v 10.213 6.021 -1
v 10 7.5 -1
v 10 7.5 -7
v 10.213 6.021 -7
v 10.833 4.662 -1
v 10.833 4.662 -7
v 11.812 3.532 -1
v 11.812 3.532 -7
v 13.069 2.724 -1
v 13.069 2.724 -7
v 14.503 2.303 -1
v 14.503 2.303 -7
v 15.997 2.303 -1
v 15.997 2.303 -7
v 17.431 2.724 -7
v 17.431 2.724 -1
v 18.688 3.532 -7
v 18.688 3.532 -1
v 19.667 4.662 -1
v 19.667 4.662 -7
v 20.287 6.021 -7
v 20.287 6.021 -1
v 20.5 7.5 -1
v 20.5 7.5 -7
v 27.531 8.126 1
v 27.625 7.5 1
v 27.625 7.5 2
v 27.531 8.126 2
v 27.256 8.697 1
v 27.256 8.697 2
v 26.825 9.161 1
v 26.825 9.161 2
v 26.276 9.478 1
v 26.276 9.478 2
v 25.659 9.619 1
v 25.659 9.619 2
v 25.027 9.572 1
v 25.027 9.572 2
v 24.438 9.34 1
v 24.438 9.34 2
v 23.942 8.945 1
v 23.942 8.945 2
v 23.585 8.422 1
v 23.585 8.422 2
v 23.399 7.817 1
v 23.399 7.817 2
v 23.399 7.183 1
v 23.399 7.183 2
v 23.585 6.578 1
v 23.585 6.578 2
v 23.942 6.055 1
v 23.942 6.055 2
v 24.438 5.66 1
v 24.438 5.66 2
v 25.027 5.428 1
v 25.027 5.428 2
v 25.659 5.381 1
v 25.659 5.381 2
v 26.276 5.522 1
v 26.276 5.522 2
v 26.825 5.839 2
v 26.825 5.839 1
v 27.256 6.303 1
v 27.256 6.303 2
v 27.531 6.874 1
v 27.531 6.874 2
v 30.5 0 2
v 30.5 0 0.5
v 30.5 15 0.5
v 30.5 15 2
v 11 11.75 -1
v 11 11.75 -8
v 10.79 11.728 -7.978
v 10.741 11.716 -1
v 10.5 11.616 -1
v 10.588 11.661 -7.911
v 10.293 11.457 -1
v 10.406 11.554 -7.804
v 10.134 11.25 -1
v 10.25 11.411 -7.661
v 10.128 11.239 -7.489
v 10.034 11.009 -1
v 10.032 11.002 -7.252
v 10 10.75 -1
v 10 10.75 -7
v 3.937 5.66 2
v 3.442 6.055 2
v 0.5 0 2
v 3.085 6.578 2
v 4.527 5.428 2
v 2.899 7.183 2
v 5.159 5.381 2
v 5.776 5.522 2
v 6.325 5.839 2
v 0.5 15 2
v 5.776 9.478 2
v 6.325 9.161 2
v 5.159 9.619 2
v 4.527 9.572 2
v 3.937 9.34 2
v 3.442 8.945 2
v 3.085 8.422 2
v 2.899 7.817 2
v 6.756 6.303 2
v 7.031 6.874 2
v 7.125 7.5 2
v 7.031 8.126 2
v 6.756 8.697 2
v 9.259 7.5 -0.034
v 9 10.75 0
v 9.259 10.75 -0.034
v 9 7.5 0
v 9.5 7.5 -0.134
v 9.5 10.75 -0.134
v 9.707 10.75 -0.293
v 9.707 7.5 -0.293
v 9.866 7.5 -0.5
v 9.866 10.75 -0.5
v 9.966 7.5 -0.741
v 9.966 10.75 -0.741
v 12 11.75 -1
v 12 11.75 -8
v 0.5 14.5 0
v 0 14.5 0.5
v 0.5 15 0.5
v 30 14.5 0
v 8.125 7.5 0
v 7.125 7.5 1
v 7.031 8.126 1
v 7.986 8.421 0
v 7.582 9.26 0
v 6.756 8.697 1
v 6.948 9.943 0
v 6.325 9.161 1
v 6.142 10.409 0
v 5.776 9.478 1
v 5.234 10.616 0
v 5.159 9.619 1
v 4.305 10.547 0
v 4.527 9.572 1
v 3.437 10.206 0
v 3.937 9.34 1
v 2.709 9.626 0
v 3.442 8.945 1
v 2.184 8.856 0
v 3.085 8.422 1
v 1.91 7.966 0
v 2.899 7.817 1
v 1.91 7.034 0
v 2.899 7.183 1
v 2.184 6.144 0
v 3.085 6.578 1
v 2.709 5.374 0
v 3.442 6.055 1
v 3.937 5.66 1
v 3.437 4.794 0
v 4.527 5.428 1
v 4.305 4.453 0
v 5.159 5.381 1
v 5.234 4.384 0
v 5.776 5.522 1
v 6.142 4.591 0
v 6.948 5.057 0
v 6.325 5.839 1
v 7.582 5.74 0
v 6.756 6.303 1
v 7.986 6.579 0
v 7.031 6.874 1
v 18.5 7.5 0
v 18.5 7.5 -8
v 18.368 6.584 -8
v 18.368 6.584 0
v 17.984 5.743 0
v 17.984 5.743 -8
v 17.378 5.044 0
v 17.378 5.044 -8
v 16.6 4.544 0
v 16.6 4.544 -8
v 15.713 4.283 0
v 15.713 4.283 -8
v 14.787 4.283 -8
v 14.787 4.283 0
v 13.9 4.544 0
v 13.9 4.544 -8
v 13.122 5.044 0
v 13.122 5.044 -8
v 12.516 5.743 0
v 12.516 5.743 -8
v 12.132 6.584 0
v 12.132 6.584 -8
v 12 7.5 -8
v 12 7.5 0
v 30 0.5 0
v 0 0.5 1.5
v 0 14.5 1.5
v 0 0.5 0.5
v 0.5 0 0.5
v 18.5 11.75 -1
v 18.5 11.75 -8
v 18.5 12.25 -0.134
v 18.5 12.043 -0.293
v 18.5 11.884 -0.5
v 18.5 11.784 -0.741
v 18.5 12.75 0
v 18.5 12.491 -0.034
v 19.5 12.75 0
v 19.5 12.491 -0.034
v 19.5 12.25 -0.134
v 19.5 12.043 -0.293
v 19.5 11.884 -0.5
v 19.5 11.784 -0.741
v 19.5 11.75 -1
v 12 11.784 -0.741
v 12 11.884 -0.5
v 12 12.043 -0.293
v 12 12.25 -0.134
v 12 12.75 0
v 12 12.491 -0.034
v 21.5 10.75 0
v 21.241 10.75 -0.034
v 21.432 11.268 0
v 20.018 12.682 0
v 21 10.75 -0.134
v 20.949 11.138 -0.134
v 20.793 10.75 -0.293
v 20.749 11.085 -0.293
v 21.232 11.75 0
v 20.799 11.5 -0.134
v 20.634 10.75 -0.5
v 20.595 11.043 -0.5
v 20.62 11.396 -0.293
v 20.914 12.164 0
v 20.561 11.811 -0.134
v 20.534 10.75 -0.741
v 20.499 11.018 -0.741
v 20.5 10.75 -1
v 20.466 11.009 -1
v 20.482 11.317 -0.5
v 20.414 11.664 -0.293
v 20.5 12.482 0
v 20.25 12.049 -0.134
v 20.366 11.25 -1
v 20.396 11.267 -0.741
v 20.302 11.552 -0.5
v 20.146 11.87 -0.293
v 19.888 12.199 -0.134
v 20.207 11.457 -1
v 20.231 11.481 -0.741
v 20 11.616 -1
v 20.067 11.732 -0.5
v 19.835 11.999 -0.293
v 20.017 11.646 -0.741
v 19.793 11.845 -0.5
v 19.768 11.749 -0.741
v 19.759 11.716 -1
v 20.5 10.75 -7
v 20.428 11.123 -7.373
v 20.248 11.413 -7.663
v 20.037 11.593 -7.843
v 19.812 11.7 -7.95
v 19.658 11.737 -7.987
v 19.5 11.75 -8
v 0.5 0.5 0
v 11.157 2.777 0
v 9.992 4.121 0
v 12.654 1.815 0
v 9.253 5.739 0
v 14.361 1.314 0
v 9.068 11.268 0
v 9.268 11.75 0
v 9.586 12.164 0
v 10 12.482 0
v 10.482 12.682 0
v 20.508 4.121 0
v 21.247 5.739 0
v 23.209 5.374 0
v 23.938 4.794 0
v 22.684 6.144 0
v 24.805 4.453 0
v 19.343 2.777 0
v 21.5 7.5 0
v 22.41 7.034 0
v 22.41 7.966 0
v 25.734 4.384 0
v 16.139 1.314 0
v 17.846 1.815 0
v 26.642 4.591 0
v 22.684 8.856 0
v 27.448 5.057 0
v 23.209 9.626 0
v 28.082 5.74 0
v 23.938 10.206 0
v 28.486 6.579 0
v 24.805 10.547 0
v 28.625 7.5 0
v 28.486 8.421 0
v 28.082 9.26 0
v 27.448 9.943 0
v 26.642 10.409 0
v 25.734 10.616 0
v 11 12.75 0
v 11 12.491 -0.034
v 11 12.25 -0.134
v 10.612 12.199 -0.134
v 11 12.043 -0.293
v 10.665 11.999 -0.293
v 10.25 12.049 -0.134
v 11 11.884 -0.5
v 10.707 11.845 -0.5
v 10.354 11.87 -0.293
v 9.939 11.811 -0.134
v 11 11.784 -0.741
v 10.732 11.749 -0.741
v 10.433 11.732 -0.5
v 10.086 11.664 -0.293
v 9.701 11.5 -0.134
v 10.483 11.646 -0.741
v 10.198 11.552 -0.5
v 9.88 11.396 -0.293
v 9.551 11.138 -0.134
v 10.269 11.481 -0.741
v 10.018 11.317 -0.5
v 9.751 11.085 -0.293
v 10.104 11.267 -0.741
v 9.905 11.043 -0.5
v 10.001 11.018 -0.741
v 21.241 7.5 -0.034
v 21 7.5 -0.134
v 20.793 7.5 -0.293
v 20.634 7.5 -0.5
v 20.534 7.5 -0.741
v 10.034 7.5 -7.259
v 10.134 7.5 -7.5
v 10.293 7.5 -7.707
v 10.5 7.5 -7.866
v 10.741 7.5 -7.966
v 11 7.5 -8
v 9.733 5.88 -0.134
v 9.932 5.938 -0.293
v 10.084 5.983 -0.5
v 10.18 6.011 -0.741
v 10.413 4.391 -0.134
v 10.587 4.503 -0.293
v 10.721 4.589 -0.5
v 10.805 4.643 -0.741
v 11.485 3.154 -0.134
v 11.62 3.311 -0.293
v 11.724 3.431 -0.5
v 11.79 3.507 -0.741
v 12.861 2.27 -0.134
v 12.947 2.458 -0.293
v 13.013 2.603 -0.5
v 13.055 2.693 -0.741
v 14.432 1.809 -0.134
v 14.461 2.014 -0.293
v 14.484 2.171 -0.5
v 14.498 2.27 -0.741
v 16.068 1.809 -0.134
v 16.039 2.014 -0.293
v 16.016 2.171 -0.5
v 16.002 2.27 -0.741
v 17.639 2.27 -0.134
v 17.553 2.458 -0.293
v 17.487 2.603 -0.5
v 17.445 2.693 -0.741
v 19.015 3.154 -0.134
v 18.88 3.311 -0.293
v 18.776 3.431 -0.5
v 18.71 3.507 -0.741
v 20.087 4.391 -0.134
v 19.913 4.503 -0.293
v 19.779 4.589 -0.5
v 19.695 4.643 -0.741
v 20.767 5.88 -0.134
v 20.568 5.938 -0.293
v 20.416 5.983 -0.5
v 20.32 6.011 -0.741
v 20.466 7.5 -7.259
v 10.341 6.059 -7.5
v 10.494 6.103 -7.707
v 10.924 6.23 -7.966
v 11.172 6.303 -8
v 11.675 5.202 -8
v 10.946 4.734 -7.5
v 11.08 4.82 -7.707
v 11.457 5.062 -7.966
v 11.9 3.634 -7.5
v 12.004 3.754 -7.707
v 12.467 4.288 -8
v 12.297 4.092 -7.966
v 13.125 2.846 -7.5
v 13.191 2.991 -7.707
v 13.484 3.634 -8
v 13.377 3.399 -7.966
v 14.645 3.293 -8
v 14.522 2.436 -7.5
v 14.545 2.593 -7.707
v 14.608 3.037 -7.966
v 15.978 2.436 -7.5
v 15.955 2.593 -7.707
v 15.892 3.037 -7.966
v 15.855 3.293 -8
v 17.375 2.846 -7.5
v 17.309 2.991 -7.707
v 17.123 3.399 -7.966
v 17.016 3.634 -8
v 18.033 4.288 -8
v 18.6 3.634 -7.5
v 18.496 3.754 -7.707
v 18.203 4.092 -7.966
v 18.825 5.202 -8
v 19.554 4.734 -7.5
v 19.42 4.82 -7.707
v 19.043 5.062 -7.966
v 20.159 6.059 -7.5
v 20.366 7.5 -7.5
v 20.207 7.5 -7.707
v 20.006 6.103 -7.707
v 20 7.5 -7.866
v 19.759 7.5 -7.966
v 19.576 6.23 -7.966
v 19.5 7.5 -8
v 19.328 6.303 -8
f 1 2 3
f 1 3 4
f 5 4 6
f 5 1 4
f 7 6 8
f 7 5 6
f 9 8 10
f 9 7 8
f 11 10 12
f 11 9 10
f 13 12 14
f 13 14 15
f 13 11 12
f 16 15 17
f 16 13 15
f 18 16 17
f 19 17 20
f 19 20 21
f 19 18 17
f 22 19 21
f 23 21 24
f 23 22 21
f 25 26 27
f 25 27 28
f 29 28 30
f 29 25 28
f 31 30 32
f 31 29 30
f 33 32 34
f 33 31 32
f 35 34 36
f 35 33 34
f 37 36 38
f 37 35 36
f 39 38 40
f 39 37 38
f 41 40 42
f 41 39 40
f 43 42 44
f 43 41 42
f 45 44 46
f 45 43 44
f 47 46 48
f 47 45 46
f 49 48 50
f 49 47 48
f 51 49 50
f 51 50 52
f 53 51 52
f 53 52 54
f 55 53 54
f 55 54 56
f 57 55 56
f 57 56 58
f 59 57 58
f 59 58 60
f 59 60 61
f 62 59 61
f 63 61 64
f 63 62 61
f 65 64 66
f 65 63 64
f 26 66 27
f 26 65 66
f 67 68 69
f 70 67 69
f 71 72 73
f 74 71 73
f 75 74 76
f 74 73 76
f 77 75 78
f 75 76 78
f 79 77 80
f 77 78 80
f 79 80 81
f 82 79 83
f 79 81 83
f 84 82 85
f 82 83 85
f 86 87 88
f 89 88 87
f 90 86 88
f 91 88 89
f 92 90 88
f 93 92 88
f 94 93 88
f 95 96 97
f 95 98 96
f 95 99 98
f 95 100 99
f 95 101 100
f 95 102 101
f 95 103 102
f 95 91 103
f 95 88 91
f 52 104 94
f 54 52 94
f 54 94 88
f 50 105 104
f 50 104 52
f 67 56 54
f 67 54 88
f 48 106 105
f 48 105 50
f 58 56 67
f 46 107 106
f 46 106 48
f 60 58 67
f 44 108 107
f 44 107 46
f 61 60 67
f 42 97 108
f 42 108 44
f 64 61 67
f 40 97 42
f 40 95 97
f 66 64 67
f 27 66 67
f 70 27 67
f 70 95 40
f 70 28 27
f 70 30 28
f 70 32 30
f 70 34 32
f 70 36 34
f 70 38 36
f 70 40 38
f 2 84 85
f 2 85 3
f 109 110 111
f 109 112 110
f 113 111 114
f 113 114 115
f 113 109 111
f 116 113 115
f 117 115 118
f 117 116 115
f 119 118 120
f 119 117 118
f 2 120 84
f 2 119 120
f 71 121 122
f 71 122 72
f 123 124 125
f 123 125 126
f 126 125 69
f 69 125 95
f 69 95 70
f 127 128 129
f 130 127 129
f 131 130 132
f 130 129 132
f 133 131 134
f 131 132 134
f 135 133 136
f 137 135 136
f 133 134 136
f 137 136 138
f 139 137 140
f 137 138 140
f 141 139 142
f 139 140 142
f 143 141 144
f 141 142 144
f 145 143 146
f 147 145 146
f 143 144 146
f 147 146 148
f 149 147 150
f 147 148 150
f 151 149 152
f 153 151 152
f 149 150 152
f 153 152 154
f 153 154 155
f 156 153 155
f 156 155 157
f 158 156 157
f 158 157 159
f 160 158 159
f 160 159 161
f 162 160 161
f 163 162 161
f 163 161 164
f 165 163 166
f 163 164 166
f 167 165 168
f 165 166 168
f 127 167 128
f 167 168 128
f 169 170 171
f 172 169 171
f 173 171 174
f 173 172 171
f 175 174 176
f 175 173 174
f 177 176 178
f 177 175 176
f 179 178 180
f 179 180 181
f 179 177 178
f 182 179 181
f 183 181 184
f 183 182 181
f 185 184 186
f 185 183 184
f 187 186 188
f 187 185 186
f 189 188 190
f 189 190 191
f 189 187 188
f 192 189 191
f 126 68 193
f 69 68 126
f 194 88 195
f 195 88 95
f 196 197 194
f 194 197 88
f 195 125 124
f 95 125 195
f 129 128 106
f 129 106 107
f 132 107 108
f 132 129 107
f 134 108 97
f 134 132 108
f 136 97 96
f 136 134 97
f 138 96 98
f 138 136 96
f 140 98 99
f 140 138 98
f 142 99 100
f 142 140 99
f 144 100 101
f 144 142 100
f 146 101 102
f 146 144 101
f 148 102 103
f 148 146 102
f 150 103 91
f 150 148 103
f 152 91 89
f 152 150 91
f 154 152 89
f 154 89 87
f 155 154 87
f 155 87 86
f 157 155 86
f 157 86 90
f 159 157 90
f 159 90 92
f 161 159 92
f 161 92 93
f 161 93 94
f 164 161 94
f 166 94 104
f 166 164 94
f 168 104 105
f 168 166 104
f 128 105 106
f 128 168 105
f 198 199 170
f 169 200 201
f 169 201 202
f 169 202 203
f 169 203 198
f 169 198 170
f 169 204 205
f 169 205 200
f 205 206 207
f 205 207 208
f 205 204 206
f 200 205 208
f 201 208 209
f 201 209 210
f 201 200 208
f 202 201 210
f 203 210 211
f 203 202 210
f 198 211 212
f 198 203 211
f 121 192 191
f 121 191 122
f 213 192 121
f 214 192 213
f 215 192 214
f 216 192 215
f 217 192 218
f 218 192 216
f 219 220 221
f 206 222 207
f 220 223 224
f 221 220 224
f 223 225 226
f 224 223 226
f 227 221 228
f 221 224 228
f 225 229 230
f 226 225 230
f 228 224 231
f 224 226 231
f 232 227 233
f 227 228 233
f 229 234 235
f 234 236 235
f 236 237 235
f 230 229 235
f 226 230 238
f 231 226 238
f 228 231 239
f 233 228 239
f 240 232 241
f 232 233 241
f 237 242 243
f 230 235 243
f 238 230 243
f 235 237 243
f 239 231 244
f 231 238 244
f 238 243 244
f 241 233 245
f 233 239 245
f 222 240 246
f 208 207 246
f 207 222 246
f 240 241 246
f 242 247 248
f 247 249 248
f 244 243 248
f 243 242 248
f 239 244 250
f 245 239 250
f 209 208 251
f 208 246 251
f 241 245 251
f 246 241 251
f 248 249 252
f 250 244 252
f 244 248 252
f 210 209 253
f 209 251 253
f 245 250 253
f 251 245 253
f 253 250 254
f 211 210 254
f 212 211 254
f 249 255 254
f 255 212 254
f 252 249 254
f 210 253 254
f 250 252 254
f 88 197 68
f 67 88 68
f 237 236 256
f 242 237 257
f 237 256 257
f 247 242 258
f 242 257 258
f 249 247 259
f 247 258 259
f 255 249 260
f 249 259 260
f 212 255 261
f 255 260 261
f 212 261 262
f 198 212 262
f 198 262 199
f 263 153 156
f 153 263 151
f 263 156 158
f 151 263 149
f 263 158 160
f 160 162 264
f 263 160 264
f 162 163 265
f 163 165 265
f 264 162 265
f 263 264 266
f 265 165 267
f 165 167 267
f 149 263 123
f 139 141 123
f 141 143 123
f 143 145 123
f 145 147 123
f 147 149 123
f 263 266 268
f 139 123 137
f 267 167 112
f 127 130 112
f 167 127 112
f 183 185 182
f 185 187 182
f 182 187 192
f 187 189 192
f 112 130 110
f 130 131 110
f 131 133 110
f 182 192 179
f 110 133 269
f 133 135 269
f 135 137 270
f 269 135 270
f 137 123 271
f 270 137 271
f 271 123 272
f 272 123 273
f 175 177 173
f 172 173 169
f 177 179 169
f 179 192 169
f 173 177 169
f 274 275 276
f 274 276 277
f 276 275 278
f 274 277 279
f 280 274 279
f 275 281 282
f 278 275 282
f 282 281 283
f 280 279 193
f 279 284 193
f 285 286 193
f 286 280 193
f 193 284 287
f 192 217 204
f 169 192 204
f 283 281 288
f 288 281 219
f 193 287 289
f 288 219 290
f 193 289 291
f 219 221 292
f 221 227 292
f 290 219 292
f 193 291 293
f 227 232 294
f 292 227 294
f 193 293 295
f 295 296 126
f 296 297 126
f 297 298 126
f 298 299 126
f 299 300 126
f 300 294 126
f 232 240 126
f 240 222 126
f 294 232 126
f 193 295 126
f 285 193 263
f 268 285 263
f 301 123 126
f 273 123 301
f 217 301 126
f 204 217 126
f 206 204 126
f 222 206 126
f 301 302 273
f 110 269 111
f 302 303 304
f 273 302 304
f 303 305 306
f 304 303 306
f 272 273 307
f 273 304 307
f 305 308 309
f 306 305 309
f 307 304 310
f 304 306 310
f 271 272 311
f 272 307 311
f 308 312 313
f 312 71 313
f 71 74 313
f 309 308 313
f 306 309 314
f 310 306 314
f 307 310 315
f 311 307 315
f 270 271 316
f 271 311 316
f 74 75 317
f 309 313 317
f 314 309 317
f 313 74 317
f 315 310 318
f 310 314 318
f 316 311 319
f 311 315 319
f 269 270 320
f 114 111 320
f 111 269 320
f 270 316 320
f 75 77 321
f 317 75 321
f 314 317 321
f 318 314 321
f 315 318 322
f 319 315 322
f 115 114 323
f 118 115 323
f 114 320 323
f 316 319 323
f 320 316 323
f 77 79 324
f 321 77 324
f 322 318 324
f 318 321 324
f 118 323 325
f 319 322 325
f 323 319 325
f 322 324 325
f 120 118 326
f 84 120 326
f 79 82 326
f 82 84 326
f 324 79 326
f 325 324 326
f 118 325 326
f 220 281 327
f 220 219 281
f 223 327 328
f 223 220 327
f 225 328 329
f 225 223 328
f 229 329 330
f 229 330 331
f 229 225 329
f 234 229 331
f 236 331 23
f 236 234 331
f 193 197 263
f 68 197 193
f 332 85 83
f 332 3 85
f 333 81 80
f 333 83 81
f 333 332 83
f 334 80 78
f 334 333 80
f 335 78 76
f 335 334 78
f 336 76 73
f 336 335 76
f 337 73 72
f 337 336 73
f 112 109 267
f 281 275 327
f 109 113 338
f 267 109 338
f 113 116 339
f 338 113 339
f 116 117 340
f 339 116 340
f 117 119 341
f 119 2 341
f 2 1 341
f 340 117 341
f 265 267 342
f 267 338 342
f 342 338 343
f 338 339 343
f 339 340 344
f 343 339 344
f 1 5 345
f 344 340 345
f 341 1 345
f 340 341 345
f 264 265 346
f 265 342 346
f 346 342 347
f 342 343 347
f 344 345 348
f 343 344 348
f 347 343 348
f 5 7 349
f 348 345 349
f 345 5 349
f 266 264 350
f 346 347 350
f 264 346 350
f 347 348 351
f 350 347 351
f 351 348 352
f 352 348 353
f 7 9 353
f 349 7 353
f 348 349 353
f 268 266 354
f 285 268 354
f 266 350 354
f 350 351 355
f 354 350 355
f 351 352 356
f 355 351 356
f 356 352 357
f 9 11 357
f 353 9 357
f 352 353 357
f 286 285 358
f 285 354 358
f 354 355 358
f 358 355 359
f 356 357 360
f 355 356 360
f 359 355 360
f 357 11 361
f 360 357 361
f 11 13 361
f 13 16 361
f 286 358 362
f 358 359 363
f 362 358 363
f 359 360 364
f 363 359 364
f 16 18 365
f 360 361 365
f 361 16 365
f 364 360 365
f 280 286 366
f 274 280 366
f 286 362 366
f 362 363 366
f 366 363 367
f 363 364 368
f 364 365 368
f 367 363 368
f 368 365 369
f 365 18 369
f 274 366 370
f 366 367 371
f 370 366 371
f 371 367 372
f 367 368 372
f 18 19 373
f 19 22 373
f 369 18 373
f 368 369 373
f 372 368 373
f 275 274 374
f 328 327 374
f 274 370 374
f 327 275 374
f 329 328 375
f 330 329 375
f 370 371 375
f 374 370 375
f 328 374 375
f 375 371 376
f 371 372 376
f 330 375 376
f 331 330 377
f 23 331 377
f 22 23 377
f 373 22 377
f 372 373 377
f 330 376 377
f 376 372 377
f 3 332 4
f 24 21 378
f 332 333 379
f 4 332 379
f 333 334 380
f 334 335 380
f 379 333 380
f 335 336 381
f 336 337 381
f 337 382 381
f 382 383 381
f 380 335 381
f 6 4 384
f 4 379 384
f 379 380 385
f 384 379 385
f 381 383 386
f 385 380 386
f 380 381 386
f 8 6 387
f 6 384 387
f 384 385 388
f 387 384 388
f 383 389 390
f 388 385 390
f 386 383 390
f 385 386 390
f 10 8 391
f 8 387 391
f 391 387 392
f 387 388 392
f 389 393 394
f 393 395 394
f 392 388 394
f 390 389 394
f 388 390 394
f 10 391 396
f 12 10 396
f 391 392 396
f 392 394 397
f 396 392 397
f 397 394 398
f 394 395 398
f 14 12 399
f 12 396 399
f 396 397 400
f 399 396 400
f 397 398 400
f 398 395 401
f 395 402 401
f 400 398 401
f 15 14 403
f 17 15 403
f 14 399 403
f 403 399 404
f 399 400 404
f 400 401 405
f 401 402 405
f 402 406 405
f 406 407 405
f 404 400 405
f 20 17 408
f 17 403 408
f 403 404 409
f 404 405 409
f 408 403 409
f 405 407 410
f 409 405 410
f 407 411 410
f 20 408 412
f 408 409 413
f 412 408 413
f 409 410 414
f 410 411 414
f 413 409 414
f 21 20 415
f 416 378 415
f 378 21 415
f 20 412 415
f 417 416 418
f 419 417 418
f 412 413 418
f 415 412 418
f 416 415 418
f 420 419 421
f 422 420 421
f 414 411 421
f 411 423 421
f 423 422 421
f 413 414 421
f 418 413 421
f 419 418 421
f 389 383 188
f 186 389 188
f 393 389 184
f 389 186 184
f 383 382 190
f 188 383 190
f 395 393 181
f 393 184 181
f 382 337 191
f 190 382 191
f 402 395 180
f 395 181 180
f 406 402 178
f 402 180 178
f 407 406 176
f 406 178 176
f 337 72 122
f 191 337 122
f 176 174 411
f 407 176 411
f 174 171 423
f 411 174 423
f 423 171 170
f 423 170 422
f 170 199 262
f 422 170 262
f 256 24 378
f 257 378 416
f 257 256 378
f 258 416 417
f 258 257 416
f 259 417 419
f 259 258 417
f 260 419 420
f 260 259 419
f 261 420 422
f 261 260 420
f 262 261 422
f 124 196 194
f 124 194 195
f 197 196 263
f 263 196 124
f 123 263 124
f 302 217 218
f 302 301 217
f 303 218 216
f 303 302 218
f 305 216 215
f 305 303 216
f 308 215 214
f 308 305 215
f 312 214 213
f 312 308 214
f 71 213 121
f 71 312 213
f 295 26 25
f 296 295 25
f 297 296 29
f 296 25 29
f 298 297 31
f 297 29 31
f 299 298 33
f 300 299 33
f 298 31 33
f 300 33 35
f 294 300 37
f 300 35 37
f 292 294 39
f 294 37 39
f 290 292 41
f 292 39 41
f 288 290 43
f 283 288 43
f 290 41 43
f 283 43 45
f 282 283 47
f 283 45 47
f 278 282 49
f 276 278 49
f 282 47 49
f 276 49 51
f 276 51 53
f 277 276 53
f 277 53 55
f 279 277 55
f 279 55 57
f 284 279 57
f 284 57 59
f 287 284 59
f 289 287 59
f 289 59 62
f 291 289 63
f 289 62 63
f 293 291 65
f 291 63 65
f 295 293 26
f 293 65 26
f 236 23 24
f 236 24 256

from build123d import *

# Parameters (mm, degrees)
ESQUISSE1_W        = 30.5
ESQUISSE1_H        = 15
ESQUISSE1_R        = 2.125
BOSS_EXTRU_3_DEPTH = 2
BOSS_EXTRU_4_DEPTH = 8
CONG_3_R           = 1
CHANFREIN2_SIZE    = 1
CHANFREIN3_SIZE    = 0.5


with BuildPart() as part:
    # Esquisse1 → Boss.-Extru.3 (new body)
    with BuildSketch(Plane.XY):
        with Locations((15.25, 7.5)):
            Rectangle(ESQUISSE1_W, ESQUISSE1_H)
        with Locations((5, 7.5)):
            Circle(ESQUISSE1_R, mode=Mode.SUBTRACT)
        with Locations((25.5, 7.5)):
            Circle(ESQUISSE1_R, mode=Mode.SUBTRACT)
    extrude(amount=BOSS_EXTRU_3_DEPTH)

    # Esquisse1<5> → Boss.-Extru.4 (add)
    with BuildSketch(Plane.XY):
        with BuildLine():
            Line((12, 7.5), (12, 11.75))
            Line((12, 11.75), (10, 11.75))
            Line((10, 11.75), (10, 7.5))
            ThreePointArc((10, 7.5), (15.25, 2.25), (20.5, 7.5))
            Line((20.5, 7.5), (20.5, 11.75))
            Line((20.5, 11.75), (18.5, 11.75))
            Line((18.5, 11.75), (18.5, 7.5))
            ThreePointArc((18.5, 7.5), (15.25, 4.25), (12, 7.5))
        make_face()
    extrude(amount=-BOSS_EXTRU_4_DEPTH)

    # Congé3
    cong_3_edges = [part.edges().sort_by_distance(p)[0] for p in [
        (10, 9.625, 0),
        (10, 11.75, -4),
        (19.5, 11.75, 0),
        (20.5, 9.625, -8),
        (20.5, 11.75, -4),
        (15.25, 2.25, -8),
        (10, 9.625, -8),
        (15.25, 2.25, 0),
        (20.5, 9.625, 0),
        (11, 11.75, 0),
    ]]
    fillet(cong_3_edges, radius=CONG_3_R)

    # Chanfrein2
    chanfrein2_edges = [part.edges().sort_by_distance(p)[0] for p in [
        (23.375, 7.5, 0),
        (2.875, 7.5, 0),
    ]]
    chamfer(chanfrein2_edges, length=CHANFREIN2_SIZE)

    # Chanfrein3
    chanfrein3_edges = [part.edges().sort_by_distance(p)[0] for p in [
        (0, 0, 1),
        (0, 15, 1),
        (0, 7.5, 2),
        (0, 7.5, 0),
        (15.25, 15, 0),
        (30.5, 7.5, 0),
        (15.25, 0, 0),
    ]]
    chamfer(chanfrein3_edges, length=CHANFREIN3_SIZE)


solid = part.part
